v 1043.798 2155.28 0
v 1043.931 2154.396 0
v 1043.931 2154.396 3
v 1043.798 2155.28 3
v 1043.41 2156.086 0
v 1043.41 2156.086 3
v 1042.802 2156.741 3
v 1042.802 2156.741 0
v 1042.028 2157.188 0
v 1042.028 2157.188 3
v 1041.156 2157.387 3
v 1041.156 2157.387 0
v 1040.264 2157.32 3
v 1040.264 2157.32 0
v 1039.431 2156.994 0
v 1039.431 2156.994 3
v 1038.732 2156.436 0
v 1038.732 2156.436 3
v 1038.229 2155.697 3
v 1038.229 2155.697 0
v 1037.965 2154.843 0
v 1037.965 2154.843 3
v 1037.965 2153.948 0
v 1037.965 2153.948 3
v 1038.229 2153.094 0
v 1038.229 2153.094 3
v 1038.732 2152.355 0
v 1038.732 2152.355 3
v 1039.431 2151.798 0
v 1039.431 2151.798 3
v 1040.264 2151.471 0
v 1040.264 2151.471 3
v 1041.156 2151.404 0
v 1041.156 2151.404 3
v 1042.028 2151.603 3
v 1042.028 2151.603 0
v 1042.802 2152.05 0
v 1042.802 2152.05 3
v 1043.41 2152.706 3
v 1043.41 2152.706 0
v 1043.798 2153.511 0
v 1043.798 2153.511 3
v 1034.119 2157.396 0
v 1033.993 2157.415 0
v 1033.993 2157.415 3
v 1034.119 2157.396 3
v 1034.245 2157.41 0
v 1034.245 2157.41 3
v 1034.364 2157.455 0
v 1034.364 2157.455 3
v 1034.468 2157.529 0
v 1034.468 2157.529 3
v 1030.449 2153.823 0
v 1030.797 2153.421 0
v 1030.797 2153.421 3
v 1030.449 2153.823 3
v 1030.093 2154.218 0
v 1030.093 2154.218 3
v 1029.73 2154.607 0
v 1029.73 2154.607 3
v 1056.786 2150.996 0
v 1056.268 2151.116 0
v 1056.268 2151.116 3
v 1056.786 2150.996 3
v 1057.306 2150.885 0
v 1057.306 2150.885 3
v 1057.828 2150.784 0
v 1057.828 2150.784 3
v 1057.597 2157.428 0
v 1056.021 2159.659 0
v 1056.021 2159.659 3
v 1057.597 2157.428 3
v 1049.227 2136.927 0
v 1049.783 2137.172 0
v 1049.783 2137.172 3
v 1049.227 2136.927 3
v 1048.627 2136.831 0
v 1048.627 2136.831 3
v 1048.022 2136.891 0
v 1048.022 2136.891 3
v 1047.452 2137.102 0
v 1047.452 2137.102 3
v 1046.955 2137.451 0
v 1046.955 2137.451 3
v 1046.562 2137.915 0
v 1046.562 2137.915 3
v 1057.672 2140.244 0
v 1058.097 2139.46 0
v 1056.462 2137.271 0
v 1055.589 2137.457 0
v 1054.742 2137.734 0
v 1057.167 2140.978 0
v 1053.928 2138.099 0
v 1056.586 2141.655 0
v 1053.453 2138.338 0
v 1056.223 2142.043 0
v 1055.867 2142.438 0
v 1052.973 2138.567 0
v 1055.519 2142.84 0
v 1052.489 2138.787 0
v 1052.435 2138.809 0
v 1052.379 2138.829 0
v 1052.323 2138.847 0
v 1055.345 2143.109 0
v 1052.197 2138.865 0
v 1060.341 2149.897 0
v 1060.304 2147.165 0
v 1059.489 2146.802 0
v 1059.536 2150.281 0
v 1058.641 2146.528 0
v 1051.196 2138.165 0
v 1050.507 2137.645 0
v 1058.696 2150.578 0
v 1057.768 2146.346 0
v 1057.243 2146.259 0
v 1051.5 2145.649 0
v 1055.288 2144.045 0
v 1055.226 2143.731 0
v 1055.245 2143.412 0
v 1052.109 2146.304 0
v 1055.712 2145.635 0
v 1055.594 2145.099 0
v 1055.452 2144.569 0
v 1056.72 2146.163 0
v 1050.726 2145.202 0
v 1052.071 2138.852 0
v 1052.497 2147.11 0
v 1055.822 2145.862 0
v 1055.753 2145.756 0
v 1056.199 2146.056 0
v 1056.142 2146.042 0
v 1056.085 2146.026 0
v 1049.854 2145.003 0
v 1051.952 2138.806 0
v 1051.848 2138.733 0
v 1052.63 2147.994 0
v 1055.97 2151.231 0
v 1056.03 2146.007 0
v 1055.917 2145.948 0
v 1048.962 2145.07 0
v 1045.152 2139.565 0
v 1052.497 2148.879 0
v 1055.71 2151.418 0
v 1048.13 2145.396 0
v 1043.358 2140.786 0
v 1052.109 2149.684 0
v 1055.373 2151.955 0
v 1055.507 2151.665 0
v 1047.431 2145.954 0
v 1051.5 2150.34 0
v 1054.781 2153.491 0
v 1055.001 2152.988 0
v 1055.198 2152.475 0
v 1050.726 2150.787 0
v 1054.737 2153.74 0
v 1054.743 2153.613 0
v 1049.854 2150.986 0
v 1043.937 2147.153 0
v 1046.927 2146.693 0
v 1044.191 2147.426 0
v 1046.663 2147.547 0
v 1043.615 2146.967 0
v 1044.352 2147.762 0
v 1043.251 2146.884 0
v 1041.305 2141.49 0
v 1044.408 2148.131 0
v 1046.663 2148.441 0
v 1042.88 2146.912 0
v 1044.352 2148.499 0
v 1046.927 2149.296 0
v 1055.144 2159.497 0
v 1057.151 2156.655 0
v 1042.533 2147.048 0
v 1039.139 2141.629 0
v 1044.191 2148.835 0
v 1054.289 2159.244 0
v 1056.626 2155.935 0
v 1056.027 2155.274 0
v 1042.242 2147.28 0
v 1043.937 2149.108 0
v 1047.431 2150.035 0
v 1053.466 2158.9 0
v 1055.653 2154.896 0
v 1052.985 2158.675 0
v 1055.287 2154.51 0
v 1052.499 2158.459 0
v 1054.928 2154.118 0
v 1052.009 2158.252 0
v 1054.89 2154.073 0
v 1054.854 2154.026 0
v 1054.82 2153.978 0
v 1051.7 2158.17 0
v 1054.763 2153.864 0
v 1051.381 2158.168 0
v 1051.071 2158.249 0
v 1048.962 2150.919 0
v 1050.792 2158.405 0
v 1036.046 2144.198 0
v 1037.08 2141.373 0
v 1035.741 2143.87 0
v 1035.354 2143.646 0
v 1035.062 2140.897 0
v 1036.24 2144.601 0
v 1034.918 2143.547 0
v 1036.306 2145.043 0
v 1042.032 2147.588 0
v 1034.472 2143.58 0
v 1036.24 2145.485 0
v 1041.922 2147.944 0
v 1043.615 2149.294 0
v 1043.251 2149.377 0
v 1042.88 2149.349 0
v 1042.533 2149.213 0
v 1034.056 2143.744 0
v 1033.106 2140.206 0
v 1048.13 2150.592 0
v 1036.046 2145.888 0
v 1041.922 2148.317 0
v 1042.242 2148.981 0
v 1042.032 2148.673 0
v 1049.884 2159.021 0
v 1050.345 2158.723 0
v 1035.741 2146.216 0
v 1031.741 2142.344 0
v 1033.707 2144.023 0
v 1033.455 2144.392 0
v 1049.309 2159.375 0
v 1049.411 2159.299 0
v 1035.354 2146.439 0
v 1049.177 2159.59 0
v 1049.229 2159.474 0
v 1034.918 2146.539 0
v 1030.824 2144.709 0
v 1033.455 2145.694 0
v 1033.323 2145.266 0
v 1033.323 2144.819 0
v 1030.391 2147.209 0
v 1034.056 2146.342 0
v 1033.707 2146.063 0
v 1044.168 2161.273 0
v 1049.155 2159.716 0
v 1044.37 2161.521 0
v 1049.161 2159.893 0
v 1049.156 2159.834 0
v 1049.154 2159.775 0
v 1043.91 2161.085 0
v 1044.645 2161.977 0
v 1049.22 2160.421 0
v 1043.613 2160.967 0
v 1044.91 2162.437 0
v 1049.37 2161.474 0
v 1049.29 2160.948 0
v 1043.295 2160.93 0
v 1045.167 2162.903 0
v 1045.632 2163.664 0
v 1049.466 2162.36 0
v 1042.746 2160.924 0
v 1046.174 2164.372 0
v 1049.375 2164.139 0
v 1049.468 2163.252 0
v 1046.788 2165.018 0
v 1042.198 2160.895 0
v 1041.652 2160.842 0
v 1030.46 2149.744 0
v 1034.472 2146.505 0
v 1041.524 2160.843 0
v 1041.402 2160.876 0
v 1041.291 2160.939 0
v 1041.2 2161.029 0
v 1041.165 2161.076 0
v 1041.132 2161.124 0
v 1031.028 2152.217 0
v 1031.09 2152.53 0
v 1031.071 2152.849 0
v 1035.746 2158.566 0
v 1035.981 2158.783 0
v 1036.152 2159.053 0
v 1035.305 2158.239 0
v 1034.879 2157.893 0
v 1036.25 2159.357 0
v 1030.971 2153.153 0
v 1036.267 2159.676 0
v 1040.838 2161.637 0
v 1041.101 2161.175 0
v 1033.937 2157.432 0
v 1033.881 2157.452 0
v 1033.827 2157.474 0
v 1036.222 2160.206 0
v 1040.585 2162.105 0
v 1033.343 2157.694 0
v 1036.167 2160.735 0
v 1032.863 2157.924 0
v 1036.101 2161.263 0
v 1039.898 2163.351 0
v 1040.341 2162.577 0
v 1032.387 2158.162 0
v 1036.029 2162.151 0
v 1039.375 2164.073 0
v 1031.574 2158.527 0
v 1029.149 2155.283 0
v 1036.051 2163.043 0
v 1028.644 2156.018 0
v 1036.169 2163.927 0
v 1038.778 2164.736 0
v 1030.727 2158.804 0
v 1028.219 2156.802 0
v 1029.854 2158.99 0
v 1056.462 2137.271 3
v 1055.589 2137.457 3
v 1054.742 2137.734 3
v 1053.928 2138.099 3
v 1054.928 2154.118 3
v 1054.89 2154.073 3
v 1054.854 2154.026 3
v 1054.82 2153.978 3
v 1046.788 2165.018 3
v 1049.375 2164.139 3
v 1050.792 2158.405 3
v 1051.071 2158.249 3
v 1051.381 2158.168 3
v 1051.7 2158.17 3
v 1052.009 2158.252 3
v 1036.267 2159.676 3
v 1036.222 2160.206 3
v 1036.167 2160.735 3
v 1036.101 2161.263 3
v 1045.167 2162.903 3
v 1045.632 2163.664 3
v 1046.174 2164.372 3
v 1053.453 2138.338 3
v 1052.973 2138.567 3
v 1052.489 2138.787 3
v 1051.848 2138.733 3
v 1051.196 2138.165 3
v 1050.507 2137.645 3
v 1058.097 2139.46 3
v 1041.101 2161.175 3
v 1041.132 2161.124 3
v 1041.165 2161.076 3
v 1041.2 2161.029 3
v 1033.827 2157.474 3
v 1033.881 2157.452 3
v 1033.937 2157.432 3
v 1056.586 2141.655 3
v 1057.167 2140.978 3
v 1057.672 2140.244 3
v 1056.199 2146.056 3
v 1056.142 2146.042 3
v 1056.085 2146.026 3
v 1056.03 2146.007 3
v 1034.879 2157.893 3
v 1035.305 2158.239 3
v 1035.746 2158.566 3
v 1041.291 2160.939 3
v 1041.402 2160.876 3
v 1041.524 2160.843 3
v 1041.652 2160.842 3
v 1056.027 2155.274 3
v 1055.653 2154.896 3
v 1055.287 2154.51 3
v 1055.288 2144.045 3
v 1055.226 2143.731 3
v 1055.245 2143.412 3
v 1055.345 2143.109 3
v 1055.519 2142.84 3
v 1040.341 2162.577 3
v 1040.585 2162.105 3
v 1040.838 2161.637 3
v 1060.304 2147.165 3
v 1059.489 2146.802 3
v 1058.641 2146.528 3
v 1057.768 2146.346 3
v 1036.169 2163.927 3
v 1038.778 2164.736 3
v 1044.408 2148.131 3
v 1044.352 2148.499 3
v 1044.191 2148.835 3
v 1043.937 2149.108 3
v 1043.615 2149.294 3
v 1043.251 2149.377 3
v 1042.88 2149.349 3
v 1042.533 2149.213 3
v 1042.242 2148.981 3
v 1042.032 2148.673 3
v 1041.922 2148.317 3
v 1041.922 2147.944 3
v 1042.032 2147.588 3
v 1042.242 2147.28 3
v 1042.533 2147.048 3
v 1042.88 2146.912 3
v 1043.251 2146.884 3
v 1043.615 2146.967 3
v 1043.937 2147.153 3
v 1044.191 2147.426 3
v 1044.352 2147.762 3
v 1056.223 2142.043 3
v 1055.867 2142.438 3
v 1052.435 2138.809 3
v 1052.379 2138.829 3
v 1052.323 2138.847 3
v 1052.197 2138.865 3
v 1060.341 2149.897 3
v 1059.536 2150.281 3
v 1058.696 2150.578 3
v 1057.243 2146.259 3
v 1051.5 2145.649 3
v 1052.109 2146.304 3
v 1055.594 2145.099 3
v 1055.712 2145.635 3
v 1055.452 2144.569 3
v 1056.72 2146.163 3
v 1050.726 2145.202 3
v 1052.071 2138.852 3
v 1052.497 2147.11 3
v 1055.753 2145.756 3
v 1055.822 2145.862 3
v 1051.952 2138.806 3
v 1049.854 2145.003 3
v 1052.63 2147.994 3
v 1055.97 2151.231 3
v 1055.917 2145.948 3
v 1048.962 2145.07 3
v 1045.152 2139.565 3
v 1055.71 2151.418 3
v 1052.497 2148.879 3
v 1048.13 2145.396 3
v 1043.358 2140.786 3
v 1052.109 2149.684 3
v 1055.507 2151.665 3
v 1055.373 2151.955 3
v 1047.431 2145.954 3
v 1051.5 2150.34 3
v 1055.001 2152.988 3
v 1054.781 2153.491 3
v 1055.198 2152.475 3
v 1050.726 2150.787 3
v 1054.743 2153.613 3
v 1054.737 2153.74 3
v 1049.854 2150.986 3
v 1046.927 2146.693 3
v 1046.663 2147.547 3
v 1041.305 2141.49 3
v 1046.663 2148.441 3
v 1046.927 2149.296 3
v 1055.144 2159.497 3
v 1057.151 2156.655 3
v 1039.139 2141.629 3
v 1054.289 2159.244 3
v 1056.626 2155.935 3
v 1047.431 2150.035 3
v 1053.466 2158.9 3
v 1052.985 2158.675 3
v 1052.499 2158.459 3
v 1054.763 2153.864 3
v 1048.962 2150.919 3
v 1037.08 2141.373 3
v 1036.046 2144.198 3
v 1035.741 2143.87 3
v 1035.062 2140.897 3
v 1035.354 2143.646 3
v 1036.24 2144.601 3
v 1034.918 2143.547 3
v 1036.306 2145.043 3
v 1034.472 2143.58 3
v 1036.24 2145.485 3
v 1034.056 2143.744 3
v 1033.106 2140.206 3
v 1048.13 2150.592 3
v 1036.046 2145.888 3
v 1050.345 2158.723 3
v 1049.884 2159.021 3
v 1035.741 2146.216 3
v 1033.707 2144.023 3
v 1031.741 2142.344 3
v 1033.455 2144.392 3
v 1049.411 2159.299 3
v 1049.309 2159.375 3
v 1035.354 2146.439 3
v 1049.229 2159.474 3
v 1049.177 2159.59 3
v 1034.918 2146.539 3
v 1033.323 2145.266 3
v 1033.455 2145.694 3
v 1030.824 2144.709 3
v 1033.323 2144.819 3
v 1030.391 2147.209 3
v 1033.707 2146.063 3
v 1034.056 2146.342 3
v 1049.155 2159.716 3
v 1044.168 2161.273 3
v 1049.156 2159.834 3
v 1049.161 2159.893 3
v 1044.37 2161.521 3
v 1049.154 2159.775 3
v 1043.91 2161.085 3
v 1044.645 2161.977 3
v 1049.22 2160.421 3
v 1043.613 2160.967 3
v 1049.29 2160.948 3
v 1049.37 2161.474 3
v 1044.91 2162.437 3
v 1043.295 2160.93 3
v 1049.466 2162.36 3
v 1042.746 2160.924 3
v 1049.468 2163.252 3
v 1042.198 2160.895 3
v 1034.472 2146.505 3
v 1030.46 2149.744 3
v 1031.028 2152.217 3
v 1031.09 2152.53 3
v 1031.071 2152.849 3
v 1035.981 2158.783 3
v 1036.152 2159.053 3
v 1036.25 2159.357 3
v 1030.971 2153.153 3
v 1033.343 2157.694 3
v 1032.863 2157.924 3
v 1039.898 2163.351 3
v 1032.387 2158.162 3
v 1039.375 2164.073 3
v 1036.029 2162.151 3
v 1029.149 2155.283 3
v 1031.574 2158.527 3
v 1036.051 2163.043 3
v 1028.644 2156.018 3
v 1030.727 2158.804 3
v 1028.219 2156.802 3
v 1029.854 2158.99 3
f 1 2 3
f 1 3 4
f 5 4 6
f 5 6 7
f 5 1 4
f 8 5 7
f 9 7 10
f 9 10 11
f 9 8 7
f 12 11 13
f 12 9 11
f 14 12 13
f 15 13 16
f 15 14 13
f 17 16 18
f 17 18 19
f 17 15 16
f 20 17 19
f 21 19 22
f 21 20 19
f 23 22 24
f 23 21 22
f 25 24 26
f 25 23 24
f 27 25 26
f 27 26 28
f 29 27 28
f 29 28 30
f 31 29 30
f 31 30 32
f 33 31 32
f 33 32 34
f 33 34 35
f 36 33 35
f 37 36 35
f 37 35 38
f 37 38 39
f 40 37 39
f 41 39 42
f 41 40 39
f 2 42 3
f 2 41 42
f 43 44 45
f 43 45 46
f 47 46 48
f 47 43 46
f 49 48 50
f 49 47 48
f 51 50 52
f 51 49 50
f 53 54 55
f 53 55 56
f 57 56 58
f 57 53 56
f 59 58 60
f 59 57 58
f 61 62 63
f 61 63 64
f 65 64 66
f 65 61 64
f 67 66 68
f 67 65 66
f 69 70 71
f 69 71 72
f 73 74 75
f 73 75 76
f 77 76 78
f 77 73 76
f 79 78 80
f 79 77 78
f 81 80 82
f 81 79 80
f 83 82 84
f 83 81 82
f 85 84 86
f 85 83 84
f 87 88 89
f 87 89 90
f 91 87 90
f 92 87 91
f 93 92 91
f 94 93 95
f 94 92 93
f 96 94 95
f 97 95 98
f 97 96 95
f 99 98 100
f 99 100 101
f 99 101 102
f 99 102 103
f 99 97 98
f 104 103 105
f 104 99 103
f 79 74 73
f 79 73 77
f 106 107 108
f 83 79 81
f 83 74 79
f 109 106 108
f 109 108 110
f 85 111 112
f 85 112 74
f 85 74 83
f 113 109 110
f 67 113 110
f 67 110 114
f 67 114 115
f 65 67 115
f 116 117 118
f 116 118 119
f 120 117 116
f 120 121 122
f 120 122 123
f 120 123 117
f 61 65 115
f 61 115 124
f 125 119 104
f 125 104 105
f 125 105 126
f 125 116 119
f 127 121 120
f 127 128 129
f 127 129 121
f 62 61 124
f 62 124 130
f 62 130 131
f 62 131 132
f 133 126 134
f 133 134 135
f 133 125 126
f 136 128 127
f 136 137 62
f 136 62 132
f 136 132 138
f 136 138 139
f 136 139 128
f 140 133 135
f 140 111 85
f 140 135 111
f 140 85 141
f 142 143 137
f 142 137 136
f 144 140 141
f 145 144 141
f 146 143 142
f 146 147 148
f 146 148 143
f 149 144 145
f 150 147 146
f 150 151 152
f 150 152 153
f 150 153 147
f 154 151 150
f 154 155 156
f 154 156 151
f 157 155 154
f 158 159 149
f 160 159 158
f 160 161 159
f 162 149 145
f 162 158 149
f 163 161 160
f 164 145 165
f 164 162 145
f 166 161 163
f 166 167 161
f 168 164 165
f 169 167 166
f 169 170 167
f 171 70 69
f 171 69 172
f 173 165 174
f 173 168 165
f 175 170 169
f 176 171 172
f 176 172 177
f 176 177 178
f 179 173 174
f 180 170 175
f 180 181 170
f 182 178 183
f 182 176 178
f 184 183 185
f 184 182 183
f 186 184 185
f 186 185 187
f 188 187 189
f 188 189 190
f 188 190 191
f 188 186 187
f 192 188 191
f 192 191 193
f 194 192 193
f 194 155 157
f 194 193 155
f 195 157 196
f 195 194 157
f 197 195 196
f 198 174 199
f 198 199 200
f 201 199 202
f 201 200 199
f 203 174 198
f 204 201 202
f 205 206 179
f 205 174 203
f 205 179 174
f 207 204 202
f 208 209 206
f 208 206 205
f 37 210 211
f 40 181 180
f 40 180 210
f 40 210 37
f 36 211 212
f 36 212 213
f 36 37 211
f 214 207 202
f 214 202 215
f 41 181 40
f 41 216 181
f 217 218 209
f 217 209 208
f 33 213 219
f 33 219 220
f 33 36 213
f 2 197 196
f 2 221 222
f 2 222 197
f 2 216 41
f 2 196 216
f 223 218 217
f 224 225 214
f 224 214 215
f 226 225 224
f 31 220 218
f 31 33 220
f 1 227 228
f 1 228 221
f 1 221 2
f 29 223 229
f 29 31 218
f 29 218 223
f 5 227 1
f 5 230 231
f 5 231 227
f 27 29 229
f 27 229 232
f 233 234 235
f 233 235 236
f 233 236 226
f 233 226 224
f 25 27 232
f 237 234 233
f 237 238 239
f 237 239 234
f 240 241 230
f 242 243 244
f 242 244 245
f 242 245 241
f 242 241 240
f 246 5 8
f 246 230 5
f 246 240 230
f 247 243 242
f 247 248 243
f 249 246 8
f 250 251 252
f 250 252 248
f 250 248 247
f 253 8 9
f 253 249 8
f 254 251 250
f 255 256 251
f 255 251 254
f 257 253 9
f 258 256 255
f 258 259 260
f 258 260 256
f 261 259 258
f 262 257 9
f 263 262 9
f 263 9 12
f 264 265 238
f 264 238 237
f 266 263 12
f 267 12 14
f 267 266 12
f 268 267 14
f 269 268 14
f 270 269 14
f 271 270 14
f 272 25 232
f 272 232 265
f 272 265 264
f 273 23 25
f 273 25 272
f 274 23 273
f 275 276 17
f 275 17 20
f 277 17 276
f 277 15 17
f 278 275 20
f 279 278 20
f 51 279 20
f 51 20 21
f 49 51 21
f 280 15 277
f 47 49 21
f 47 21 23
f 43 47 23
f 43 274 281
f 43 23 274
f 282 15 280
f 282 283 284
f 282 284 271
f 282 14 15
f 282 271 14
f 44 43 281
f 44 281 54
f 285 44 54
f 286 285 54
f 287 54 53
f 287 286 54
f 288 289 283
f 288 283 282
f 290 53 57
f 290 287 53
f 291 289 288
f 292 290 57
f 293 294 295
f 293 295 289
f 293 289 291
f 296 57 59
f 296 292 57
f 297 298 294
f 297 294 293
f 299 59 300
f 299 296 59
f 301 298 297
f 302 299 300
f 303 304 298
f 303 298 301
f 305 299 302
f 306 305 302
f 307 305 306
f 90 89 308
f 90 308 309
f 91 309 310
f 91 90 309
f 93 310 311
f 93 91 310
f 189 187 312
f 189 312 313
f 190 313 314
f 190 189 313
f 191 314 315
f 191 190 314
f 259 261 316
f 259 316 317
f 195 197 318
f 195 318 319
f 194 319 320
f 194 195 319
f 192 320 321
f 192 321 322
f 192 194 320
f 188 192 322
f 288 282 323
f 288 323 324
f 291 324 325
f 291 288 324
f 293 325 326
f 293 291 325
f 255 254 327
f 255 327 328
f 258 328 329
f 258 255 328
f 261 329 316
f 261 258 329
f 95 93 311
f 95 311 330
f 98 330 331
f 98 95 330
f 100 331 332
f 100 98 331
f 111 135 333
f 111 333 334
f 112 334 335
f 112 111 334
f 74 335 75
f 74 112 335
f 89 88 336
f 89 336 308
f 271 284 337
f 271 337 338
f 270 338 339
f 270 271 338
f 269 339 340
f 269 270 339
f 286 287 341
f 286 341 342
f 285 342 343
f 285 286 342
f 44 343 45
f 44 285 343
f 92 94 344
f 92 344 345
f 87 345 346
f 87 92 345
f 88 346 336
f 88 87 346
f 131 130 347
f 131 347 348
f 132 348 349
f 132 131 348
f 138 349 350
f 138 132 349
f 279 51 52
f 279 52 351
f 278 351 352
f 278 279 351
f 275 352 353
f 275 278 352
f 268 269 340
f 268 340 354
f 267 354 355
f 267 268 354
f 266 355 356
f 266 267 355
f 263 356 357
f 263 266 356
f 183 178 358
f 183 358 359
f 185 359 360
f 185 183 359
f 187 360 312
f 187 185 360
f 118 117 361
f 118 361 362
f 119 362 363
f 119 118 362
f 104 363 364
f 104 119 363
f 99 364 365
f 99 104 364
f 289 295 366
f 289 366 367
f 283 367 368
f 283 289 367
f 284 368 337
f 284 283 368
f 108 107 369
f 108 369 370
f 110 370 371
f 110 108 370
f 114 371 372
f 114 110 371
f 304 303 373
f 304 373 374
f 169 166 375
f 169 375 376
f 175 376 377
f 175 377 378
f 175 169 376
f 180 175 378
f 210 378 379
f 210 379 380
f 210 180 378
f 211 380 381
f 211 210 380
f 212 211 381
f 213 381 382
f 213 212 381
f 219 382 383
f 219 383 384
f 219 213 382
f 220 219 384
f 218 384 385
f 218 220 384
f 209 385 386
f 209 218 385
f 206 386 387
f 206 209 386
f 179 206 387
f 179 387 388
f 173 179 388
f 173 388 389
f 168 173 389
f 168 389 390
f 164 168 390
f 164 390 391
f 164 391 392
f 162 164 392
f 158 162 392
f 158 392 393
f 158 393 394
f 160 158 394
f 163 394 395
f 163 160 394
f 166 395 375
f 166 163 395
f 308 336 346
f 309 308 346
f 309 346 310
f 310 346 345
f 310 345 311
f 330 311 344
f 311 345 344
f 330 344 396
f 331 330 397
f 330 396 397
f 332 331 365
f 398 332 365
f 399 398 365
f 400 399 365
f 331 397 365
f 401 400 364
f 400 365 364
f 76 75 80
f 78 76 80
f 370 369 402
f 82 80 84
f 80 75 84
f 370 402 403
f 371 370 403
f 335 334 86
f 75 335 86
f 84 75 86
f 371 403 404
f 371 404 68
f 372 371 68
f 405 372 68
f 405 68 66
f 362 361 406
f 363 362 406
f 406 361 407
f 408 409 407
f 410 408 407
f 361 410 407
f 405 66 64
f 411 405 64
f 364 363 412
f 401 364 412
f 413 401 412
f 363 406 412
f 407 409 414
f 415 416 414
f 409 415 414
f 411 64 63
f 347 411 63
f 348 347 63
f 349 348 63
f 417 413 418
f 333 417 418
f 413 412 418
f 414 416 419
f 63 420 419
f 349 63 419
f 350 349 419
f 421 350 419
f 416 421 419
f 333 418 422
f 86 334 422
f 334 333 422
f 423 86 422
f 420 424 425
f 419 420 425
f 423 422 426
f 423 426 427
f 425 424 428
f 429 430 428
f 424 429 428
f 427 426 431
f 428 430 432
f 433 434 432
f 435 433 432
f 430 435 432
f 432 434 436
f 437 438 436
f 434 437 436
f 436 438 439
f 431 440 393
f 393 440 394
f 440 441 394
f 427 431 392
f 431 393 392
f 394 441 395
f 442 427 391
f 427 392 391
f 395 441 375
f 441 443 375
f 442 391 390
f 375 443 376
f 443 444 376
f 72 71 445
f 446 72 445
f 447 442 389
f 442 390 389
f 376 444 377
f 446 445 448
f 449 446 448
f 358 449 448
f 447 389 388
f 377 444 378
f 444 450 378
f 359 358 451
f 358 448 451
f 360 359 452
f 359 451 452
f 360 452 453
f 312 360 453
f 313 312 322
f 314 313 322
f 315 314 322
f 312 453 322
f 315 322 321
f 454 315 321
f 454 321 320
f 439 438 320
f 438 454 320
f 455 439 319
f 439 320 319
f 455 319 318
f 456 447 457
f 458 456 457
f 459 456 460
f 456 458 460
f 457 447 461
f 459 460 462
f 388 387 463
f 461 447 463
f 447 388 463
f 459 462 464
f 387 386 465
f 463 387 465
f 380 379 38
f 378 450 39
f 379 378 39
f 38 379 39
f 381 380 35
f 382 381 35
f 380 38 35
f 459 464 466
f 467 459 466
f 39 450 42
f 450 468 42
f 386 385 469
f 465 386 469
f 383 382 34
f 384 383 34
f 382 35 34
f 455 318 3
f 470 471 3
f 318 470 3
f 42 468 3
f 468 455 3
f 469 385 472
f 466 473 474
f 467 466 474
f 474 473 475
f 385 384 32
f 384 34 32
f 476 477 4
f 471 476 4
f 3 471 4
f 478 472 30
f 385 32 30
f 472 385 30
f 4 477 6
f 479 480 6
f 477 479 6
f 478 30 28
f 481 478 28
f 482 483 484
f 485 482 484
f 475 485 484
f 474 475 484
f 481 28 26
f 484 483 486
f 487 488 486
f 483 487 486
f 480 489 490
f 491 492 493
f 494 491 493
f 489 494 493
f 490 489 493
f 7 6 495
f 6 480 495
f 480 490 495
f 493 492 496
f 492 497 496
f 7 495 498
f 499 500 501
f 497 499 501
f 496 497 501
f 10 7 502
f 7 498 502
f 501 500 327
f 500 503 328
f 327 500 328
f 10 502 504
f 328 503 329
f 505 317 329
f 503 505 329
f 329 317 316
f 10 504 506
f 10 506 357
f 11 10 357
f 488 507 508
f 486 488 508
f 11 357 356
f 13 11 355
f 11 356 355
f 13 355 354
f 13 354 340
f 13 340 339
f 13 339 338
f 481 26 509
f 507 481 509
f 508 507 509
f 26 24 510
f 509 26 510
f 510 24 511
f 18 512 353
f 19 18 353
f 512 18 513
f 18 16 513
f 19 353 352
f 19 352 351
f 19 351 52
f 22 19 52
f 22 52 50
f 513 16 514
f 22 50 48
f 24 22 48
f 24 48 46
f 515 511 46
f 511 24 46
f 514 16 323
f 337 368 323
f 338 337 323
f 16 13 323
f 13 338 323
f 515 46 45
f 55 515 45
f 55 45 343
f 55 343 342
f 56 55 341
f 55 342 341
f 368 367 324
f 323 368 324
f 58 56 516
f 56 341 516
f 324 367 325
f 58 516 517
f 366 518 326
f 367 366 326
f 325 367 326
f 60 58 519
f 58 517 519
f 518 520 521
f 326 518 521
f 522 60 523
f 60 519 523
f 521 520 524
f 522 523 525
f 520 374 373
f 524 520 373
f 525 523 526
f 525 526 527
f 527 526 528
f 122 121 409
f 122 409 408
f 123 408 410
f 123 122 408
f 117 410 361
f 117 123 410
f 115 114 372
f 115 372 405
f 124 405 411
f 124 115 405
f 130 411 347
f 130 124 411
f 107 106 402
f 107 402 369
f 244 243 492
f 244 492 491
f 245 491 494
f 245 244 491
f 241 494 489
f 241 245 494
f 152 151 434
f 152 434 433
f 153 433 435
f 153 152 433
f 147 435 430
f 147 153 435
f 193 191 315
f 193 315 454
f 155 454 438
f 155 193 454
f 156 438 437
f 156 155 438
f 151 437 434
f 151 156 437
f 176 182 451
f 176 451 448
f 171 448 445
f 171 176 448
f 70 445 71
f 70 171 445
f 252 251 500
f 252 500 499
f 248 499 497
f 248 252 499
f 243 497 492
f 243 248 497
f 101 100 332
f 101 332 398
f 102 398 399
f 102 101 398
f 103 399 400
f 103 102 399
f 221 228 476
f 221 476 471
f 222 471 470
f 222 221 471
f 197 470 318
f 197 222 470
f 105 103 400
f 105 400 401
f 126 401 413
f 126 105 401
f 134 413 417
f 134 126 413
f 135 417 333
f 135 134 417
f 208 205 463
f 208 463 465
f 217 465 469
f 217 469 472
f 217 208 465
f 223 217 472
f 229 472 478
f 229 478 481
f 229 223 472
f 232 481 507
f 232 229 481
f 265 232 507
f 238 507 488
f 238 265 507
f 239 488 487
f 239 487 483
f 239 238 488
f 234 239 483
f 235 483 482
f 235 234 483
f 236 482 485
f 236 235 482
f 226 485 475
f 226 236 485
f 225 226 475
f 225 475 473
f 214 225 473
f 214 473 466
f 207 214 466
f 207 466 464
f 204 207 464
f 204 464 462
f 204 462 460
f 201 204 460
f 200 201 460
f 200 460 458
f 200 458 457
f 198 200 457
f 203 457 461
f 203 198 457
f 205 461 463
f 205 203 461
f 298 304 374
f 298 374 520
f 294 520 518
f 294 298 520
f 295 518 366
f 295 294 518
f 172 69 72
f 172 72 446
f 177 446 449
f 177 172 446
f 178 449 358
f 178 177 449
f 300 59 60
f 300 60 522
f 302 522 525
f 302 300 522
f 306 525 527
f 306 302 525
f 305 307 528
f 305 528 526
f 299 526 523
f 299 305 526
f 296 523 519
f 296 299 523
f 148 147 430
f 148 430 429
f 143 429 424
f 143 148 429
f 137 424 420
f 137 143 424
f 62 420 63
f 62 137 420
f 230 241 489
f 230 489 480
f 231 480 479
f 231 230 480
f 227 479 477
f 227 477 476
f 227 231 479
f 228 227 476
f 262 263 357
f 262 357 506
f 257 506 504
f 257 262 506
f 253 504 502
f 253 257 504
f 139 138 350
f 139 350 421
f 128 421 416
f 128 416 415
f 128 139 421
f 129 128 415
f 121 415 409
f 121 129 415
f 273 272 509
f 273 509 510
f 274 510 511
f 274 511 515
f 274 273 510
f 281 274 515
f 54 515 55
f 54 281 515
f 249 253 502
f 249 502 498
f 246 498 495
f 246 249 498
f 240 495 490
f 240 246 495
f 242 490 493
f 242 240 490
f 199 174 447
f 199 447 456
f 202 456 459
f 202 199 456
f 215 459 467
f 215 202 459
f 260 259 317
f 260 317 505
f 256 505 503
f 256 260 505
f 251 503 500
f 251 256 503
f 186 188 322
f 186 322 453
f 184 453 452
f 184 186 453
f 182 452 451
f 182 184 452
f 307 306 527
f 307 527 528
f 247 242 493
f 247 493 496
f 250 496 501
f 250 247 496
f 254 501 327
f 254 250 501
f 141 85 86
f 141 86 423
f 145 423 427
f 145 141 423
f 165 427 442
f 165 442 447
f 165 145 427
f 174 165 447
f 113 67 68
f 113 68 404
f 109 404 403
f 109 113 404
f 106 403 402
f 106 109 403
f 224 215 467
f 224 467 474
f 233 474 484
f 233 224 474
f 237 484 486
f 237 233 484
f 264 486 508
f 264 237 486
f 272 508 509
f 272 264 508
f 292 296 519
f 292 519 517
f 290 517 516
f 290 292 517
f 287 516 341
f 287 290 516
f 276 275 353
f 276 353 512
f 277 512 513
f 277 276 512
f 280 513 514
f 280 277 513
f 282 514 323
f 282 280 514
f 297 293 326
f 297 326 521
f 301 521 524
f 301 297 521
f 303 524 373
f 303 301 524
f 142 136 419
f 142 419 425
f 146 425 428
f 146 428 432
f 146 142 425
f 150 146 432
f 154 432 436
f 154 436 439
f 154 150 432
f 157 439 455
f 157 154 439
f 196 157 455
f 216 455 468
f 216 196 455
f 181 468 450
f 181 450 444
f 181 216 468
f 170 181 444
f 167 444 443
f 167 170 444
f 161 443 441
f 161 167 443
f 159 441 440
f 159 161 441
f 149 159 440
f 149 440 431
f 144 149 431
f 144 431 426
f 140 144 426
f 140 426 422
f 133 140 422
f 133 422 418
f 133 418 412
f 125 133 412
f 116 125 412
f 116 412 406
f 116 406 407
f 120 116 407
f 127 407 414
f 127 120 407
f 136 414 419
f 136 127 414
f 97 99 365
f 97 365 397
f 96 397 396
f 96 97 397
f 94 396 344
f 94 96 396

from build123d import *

# Parameters (mm, degrees)
ESQUISSE1_R        = 1.25
ESQUISSE1_R_2      = 3
ESQUISSE1_R_3      = 1.5
BOSS_EXTRU_1_DEPTH = 3


with BuildPart() as part:
    # Esquisse1 → Boss.-Extru.1 (new body)
    with BuildSketch(Plane.XY):
        with BuildLine():
            Line((1036.168665086, 2163.92668469), (1038.777951956, 2164.735581239))
            ThreePointArc((1038.777951956, 2164.735581239), (1039.645641159, 2163.718776789), (1040.340855862, 2162.577088409))
            ThreePointArc((1040.340855862, 2162.577088409), (1040.710583065, 2161.870292972), (1041.100970281, 2161.174695519))
            ThreePointArc((1041.100970281, 2161.174695519), (1041.148071574, 2161.099838925), (1041.200361208, 2161.028509858))
            ThreePointArc((1041.200361208, 2161.028509858), (1041.401673575, 2160.876243049), (1041.651712938, 2160.841715271))
            ThreePointArc((1041.651712938, 2160.841715271), (1042.472135802, 2160.912263521), (1043.295397124, 2160.929913601))
            ThreePointArc((1043.295397124, 2160.929913601), (1043.910230031, 2161.084508602), (1044.369546036, 2161.521484488))
            ThreePointArc((1044.369546036, 2161.521484488), (1044.778634779, 2162.206250429), (1045.167374464, 2162.902769957))
            ThreePointArc((1045.167374464, 2162.902769957), (1045.893264106, 2164.025204841), (1046.788181642, 2165.01812903))
            Line((1046.788181642, 2165.01812903), (1049.374596526, 2164.138839743))
            ThreePointArc((1049.374596526, 2164.138839743), (1049.478909177, 2162.806212746), (1049.370282093, 2161.473930495))
            ThreePointArc((1049.370282093, 2161.473930495), (1049.25395375, 2160.684800777), (1049.160921717, 2159.892586769))
            ThreePointArc((1049.160921717, 2159.892586769), (1049.155027862, 2159.804341066), (1049.155404891, 2159.715899564))
            ThreePointArc((1049.155404891, 2159.715899564), (1049.228769832, 2159.474384686), (1049.410761007, 2159.299481677))
            ThreePointArc((1049.410761007, 2159.299481677), (1050.115964268, 2158.874323951), (1050.792371125, 2158.404702301))
            ThreePointArc((1050.792371125, 2158.404702301), (1051.380650057, 2158.168382569), (1052.009092492, 2158.251924312))
            ThreePointArc((1052.009092492, 2158.251924312), (1052.742547559, 2158.565455267), (1053.466448477, 2158.900455947))
            ThreePointArc((1053.466448477, 2158.900455947), (1054.713456205, 2159.381857617), (1056.021085895, 2159.65913083))
            Line((1056.021085895, 2159.65913083), (1057.596706215, 2157.42751433))
            ThreePointArc((1057.596706215, 2157.42751433), (1056.897798427, 2156.288083004), (1056.026821411, 2155.274093419))
            ThreePointArc((1056.026821411, 2155.274093419), (1055.468870995, 2154.704050151), (1054.927954788, 2154.117818412))
            ThreePointArc((1054.927954788, 2154.117818412), (1054.871317037, 2154.04989046), (1054.819637448, 2153.97811817))
            ThreePointArc((1054.819637448, 2153.97811817), (1054.73703205, 2153.739605699), (1054.781460594, 2153.491134464))
            ThreePointArc((1054.781460594, 2153.491134464), (1055.102080574, 2152.732666561), (1055.373268538, 2151.955152691))
            ThreePointArc((1055.373268538, 2151.955152691), (1055.710290937, 2151.41818433), (1056.267816152, 2151.116381825))
            ThreePointArc((1056.267816152, 2151.116381825), (1057.045482637, 2150.938919624), (1057.828039241, 2150.784442585))
            ThreePointArc((1057.828039241, 2150.784442585), (1059.119850487, 2150.440931965), (1060.340722234, 2149.896645259))
            Line((1060.340722234, 2149.896645259), (1060.303714582, 2147.165103197))
            ThreePointArc((1060.303714582, 2147.165103197), (1059.068545375, 2146.654091582), (1057.767902043, 2146.34570422))
            ThreePointArc((1057.767902043, 2146.34570422), (1056.981447648, 2146.212484556), (1056.199258874, 2146.056155685))
            ThreePointArc((1056.199258874, 2146.056155685), (1056.113510922, 2146.034491652), (1056.029514563, 2146.006803149))
            ThreePointArc((1056.029514563, 2146.006803149), (1055.822491279, 2145.862396742), (1055.712386998, 2145.635264847))
            ThreePointArc((1055.712386998, 2145.635264847), (1055.525957764, 2144.833195728), (1055.288342248, 2144.044773508))
            ThreePointArc((1055.288342248, 2144.044773508), (1055.245377014, 2143.412260183), (1055.519029326, 2142.840391728))
            ThreePointArc((1055.519029326, 2142.840391728), (1056.043865064, 2142.239720901), (1056.58616733, 2141.65477112))
            ThreePointArc((1056.58616733, 2141.65477112), (1057.429354105, 2140.617557591), (1058.097136398, 2139.459609988))
            Line((1058.097136398, 2139.459609988), (1056.461636439, 2137.271498592))
            ThreePointArc((1056.461636439, 2137.271498592), (1055.161998468, 2137.584095755), (1053.928490366, 2138.099104107))
            ThreePointArc((1053.928490366, 2138.099104107), (1053.21393084, 2138.45359343), (1052.489239025, 2138.786879742))
            ThreePointArc((1052.489239025, 2138.786879742), (1052.407133676, 2138.819754553), (1052.3229043, 2138.846725905))
            ThreePointArc((1052.3229043, 2138.846725905), (1052.070538988, 2138.851583901), (1051.847957976, 2138.73254801))
            ThreePointArc((1051.847957976, 2138.73254801), (1050.855746376, 2137.899121153), (1049.782953643, 2137.172347506))
            ThreePointArc((1049.782953643, 2137.172347506), (1048.021944621, 2136.890714387), (1046.562157009, 2137.915160637))
            ThreePointArc((1046.562157009, 2137.915160637), (1043.357692527, 2140.785881782), (1039.138805682, 2141.628868317))
            ThreePointArc((1039.138805682, 2141.628868317), (1036.064607347, 2141.162614564), (1033.106023732, 2140.206125696))
            ThreePointArc((1033.106023732, 2140.206125696), (1030.545439739, 2145.948051891), (1031.027624755, 2152.216528933))
            ThreePointArc((1031.027624755, 2152.216528933), (1031.07058999, 2152.849042258), (1030.796937677, 2153.420910712))
            ThreePointArc((1030.796937677, 2153.420910712), (1030.27210194, 2154.02158154), (1029.729799674, 2154.606531321))
            ThreePointArc((1029.729799674, 2154.606531321), (1028.886612898, 2155.643744849), (1028.218830606, 2156.801692452))
            Line((1028.218830606, 2156.801692452), (1029.854330565, 2158.989803849))
            ThreePointArc((1029.854330565, 2158.989803849), (1031.153968536, 2158.677206686), (1032.387476638, 2158.162198333))
            ThreePointArc((1032.387476638, 2158.162198333), (1033.102036163, 2157.807709011), (1033.826727979, 2157.474422698))
            ThreePointArc((1033.826727979, 2157.474422698), (1033.908833328, 2157.441547887), (1033.993062704, 2157.414576536))
            ThreePointArc((1033.993062704, 2157.414576536), (1034.245428015, 2157.40971854), (1034.468009028, 2157.52875443))
            ThreePointArc((1034.468009028, 2157.52875443), (1035.090277846, 2158.068061624), (1035.74593579, 2158.566241703))
            ThreePointArc((1035.74593579, 2158.566241703), (1036.152477399, 2159.052701401), (1036.267223872, 2159.676201493))
            ThreePointArc((1036.267223872, 2159.676201493), (1036.195688295, 2160.470645106), (1036.1007814, 2161.262636695))
            ThreePointArc((1036.1007814, 2161.262636695), (1036.028287785, 2162.597372817), (1036.168665086, 2163.92668469))
        make_face()
        with Locations((1043.15798434, 2148.13065004)):
            Circle(ESQUISSE1_R, mode=Mode.SUBTRACT)
        with Locations((1040.931477639, 2154.395616576)):
            Circle(ESQUISSE1_R_2, mode=Mode.SUBTRACT)
        with Locations((1049.629972316, 2147.99435183)):
            Circle(ESQUISSE1_R_2, mode=Mode.SUBTRACT)
        with Locations((1034.806177599, 2145.042773361)):
            Circle(ESQUISSE1_R_3, mode=Mode.SUBTRACT)
    extrude(amount=BOSS_EXTRU_1_DEPTH)


solid = part.part
